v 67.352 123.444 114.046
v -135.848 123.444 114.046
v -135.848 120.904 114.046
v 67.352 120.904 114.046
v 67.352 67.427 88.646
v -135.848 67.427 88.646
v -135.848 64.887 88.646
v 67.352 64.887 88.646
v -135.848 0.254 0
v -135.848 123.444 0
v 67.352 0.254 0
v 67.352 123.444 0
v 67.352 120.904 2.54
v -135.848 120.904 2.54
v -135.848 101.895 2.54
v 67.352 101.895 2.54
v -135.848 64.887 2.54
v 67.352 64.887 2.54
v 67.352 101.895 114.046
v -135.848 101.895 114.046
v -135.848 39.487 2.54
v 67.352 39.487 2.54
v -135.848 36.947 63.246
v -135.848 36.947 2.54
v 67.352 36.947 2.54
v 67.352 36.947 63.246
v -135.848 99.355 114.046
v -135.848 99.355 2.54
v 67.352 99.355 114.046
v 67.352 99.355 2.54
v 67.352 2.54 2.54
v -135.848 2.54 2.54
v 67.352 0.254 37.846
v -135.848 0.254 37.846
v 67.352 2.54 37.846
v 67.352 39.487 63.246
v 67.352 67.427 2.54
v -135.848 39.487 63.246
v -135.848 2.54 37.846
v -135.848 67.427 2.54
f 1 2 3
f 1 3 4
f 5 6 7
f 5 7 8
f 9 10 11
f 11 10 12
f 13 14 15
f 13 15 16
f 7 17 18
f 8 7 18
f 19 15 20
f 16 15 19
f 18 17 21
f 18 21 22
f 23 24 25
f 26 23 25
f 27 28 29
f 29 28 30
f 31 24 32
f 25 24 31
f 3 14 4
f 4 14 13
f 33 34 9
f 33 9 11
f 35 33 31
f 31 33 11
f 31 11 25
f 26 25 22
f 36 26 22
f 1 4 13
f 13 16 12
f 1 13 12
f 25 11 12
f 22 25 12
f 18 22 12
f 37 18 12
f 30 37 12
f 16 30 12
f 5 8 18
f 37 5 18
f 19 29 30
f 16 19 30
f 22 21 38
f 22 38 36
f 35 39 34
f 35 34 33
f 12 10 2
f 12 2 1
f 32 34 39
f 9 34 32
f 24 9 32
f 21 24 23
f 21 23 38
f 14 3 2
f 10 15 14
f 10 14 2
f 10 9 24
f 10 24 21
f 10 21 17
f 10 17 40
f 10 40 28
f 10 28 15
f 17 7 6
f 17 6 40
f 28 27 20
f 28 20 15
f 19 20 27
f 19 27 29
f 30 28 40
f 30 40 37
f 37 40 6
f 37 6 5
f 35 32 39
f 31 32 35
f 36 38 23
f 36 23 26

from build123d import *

# Parameters (mm, degrees)
SKETCH_W     = 203.2
SKETCH_H     = 203.2
PAD_DEPTH    = 2.54
SKETCH001_W  = 203.2
SKETCH001_H  = 2.54
PAD001_DEPTH = 111.506
SKETCH002_W  = 203.2
SKETCH002_H  = 2.54
PAD002_DEPTH = 86.106
SKETCH003_W  = 203.2
SKETCH003_H  = 2.54
PAD003_DEPTH = 60.706
SKETCH004_W  = 203.2
SKETCH004_H  = 2.54
PAD004_DEPTH = 35.306
SKETCH007_W  = 227.037744
SKETCH007_H  = 43.51487
POCKET_DEPTH = 80.01


with BuildPart() as part:
    # Sketch (on XY_Plane of Origin) → Pad (new body)
    with BuildSketch(Plane.XY):
        with Locations((-34.247654, 21.844)):
            Rectangle(SKETCH_W, SKETCH_H)
    extrude(amount=PAD_DEPTH)

    # Sketch001 (on Face6 of Pad) → Pad001 (join)
    with BuildSketch(Plane.XY.offset(2.54)):
        with Locations((-34.247654, 122.174)):
            Rectangle(SKETCH001_W, SKETCH001_H)
        with Locations((-34.247654, 100.624772)):
            Rectangle(SKETCH001_W, SKETCH001_H)
    extrude(amount=PAD001_DEPTH)

    # Sketch002 (on Face6 of Pad001) → Pad002 (join)
    with BuildSketch(Plane.XY.offset(2.54)):
        with Locations((-34.247654, 66.156921)):
            Rectangle(SKETCH002_W, SKETCH002_H)
    extrude(amount=PAD002_DEPTH)

    # Sketch003 (on Face11 of Pad002) → Pad003 (join)
    with BuildSketch(Plane.XY.offset(2.54)):
        with Locations((-34.247654, 38.216921)):
            Rectangle(SKETCH003_W, SKETCH003_H)
    extrude(amount=PAD003_DEPTH)

    # Sketch004 (on Face15 of Pad003) → Pad004 (join)
    with BuildSketch(Plane.XY.offset(2.54)):
        with Locations((-34.247654, 1.27)):
            Rectangle(SKETCH004_W, SKETCH004_H)
    extrude(amount=PAD004_DEPTH)

    # Sketch007 → Pocket (cut)
    with BuildSketch(Plane.XZ.offset(79.756)):
        with Locations((-24.815948, 21.757435)):
            Rectangle(SKETCH007_W, SKETCH007_H)
    extrude(amount=-POCKET_DEPTH, mode=Mode.SUBTRACT)


solid = part.part
